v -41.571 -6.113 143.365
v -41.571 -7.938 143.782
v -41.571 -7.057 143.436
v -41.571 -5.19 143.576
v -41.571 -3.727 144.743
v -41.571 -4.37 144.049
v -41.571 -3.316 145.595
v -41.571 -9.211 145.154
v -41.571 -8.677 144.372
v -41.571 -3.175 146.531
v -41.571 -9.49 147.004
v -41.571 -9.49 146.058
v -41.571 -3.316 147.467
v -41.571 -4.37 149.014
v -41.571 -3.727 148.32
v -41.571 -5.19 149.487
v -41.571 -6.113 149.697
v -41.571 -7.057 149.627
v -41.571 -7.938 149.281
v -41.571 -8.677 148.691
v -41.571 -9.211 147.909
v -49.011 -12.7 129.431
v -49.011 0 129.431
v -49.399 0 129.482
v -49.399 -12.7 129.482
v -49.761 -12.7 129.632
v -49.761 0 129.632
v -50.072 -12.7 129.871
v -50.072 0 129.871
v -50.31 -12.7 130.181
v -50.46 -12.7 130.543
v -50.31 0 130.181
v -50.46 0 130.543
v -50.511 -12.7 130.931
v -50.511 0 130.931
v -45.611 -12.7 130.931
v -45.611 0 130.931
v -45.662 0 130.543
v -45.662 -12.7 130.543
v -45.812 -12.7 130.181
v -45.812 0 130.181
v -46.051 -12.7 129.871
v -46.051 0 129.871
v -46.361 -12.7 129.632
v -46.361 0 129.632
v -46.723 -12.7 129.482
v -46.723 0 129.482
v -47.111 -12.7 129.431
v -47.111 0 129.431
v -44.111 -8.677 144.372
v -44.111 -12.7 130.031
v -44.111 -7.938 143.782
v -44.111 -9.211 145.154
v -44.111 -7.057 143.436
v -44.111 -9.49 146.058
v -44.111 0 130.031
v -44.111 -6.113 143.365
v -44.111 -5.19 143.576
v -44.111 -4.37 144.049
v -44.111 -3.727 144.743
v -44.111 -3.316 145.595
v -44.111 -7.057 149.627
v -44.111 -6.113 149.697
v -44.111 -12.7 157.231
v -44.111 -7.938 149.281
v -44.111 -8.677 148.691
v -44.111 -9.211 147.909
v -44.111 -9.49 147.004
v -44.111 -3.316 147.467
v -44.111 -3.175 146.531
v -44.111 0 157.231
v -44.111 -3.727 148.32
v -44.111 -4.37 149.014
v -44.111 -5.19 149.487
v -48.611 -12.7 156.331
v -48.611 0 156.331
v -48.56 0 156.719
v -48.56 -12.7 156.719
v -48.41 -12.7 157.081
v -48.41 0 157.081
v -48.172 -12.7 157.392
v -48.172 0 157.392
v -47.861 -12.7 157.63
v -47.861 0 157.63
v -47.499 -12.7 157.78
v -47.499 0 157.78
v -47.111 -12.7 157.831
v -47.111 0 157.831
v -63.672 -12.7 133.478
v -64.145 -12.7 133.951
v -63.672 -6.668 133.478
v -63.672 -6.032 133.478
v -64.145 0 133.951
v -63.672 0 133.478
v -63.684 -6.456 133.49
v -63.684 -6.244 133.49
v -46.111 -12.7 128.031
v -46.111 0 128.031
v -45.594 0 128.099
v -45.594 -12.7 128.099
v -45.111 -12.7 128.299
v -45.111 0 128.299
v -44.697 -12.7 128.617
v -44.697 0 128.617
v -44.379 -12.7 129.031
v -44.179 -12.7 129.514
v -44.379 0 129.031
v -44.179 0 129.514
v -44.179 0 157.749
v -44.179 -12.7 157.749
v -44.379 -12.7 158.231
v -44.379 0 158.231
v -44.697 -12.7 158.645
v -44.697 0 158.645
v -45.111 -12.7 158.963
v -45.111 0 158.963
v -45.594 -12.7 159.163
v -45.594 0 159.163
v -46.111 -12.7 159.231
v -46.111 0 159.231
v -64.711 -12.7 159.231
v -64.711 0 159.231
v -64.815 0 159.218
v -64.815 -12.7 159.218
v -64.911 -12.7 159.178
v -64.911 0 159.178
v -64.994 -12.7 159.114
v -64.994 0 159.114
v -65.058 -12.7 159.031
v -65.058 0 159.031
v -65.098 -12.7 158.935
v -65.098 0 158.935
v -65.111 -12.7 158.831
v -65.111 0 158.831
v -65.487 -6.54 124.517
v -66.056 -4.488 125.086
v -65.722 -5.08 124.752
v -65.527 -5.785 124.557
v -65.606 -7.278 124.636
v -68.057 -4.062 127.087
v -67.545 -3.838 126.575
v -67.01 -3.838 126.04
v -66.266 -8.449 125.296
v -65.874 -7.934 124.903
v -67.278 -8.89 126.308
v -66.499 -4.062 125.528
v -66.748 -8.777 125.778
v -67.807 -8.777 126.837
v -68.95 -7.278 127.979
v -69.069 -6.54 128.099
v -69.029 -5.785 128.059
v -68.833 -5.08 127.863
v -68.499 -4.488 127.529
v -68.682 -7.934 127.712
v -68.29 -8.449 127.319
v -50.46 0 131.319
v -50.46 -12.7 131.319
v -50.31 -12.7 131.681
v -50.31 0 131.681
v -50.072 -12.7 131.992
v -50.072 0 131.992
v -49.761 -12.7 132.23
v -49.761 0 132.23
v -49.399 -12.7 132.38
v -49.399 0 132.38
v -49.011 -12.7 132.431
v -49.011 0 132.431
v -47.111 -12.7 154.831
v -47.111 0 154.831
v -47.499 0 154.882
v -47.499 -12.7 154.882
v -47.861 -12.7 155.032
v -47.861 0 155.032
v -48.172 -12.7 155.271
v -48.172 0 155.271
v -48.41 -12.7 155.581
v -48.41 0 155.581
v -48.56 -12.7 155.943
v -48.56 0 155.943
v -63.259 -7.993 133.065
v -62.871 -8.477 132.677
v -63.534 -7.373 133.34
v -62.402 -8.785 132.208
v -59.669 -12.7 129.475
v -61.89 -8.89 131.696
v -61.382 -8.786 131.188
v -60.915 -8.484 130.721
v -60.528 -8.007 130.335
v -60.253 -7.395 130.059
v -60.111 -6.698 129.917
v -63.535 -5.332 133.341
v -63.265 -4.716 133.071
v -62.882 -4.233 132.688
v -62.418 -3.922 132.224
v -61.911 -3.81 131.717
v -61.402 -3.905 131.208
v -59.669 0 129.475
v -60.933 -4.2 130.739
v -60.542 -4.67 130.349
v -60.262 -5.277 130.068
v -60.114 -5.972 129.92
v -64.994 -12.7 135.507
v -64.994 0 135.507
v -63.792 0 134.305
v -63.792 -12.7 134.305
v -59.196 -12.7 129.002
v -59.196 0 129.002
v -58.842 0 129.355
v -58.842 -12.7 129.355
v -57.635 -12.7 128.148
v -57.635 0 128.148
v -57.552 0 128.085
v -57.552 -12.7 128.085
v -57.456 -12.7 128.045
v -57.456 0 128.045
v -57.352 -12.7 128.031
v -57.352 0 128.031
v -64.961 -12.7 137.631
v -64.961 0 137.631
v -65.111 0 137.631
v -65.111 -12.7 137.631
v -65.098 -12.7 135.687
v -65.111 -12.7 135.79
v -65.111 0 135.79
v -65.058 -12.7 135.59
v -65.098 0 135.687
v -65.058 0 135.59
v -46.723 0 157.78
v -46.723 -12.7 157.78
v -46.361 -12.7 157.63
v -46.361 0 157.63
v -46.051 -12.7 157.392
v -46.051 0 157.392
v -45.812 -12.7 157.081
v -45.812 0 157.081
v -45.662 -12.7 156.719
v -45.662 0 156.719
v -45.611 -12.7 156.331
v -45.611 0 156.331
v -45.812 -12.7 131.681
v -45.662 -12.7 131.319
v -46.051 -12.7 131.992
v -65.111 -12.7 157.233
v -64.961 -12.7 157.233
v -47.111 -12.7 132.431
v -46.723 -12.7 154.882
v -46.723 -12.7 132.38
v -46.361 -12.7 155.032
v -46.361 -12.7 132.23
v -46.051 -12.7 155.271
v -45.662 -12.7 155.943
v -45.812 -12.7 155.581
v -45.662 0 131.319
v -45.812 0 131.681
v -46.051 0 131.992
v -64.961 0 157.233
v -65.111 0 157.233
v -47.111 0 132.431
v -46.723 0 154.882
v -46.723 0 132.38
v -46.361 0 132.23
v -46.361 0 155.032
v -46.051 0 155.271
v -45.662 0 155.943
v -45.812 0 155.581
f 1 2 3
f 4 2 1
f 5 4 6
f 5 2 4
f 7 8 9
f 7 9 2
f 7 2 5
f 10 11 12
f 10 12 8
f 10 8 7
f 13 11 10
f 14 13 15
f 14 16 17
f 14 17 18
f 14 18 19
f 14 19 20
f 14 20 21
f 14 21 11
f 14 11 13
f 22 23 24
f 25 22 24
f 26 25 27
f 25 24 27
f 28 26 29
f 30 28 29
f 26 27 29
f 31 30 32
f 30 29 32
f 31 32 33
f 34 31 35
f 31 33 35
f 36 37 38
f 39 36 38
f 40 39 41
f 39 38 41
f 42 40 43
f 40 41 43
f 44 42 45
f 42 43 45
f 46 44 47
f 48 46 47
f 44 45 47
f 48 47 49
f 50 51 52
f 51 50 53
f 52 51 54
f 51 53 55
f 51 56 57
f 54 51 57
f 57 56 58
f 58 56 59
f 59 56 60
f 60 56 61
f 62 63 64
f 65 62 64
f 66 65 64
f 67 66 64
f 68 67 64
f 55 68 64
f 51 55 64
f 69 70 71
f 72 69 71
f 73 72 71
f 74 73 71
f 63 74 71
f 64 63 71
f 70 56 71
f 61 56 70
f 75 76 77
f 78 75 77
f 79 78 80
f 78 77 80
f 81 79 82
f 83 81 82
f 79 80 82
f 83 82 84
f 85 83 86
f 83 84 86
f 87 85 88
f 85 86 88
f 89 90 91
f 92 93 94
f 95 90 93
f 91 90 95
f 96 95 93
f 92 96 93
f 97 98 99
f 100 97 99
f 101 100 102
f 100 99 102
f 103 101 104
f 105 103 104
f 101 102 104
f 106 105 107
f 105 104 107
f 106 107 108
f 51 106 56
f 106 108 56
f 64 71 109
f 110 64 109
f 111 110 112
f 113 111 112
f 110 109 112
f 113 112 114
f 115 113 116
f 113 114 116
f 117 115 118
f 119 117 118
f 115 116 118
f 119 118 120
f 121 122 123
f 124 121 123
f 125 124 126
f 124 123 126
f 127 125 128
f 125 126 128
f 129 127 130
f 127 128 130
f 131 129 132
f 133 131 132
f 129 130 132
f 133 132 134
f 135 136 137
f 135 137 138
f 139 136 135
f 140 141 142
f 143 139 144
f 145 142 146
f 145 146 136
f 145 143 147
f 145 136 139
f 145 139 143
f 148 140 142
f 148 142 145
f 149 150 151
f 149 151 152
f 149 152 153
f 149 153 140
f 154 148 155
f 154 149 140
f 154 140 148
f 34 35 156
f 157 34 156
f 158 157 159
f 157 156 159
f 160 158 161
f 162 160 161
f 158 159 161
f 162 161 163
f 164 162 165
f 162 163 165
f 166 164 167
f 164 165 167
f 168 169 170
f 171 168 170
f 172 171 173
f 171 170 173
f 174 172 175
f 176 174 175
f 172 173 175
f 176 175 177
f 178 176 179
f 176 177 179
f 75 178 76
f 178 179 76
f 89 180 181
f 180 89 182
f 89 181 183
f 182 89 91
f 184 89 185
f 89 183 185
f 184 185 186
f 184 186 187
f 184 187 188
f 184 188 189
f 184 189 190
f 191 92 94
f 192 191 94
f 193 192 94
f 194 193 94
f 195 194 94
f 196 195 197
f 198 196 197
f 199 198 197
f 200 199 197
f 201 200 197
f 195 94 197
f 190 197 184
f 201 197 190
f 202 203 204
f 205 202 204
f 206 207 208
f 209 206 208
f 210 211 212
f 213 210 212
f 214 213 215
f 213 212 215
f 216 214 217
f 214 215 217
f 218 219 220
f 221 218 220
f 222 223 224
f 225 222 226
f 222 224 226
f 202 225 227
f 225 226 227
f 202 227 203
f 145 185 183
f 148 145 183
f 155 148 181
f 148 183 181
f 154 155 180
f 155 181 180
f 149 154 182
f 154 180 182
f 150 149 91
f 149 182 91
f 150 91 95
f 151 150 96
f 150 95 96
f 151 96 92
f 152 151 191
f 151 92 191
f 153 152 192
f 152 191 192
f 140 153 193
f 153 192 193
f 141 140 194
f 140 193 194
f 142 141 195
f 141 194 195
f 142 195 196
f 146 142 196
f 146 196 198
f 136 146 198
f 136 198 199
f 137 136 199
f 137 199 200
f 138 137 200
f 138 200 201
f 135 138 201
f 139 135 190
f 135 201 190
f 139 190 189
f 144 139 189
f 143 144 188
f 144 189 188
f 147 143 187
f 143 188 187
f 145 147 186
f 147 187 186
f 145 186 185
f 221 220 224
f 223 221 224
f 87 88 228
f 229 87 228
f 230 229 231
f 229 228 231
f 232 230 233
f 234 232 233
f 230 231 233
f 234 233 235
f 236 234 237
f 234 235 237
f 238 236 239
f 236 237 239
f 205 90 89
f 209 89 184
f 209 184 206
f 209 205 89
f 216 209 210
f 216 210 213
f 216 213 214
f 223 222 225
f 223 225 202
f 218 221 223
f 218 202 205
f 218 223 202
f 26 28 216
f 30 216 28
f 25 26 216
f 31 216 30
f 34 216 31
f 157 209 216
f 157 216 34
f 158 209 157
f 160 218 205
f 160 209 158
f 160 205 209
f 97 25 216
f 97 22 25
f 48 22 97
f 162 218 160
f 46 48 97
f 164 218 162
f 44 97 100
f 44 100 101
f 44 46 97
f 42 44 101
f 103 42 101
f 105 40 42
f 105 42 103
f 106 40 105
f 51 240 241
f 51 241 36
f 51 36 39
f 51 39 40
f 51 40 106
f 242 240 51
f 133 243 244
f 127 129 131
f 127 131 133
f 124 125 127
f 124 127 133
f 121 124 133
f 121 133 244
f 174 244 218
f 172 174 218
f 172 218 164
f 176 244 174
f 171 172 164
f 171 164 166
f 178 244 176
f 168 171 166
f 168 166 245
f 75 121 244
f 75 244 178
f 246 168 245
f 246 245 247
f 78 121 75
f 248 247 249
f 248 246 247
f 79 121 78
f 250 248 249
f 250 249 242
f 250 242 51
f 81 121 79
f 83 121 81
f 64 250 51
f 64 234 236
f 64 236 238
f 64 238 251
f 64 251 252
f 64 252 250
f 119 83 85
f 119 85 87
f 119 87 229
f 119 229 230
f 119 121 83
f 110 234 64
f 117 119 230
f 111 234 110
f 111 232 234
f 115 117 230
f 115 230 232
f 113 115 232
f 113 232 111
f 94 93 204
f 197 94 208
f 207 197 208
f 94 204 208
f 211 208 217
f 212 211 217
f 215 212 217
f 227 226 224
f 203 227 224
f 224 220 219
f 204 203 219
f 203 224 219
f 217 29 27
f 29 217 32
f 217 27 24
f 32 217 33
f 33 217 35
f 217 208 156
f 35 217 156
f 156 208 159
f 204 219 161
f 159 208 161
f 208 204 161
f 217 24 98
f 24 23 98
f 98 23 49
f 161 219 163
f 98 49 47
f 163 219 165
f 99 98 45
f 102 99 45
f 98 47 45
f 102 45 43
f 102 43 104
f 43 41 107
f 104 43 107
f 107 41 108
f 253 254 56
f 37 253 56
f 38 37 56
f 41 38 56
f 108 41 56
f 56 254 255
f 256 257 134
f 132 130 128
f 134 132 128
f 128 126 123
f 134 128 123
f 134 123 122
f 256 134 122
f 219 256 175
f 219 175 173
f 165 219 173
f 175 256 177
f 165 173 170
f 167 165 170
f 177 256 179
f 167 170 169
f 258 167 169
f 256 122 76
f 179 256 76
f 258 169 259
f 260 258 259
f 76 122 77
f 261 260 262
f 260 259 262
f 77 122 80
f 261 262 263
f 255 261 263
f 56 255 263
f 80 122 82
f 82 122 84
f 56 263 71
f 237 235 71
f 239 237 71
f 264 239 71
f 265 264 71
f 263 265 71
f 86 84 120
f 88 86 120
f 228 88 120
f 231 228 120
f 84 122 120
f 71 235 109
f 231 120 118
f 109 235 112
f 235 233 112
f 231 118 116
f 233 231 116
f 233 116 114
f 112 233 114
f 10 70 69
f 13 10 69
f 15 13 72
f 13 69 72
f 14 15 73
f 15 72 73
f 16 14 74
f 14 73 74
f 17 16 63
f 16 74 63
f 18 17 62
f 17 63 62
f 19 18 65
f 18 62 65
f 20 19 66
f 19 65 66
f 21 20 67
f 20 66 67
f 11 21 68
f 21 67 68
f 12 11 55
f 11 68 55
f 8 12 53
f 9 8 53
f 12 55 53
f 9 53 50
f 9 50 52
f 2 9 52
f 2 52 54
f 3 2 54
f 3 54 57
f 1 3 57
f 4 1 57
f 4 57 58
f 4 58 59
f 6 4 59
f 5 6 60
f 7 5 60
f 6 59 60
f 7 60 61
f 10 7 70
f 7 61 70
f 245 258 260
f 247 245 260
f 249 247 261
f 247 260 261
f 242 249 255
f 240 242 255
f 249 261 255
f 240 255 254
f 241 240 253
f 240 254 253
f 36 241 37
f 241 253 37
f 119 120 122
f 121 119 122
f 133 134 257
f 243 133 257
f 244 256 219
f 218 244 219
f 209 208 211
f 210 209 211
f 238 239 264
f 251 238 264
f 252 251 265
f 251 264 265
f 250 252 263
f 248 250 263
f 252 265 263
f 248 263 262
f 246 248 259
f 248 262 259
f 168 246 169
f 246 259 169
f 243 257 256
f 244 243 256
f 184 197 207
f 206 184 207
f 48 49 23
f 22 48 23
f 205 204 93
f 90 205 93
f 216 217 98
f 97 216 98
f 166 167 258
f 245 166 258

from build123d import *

# Parameters (mm, degrees)
F1_DEPTH = 12.7
F2_R     = 2.54
F3_DEPTH = 7.62
F4_R     = 3.175
F5_DEPTH = 2.54


# Not quite as in the source:
# - ends of sketch curves that miss each other by under 0.0002 mm in the source are joined


with BuildPart() as f1:
    # F0 (on Front) → F1 (new body)
    with BuildSketch(Plane.XZ):
        with BuildLine():
            Line((-46.1111856, 159.2312536), (-64.7111856, 159.2312536))
            ThreePointArc((-64.7111856, 159.2312536), (-64.9940283125, 159.1140963125), (-65.1111856, 158.8312536))
            Line((-65.1111856, 158.8312536), (-65.1111856, 157.2332636))
            Line((-65.1111856, 157.2332636), (-64.9611856, 157.2332636))
            Line((-64.9611856, 157.2332636), (-64.9611856, 137.6312536))
            Line((-64.9611856, 137.6312536), (-65.1111856, 137.6312536))
            Line((-65.1111856, 137.6312536), (-65.1111856, 135.7900576))
            ThreePointArc((-65.1111856, 135.7900576), (-65.080737413, 135.6369842271), (-64.9940283125, 135.5072148875))
            Line((-64.9940283125, 135.5072148875), (-63.7917726, 134.3049586))
            Line((-63.7917726, 134.3049586), (-64.1453256, 133.9514056))
            Line((-64.1453256, 133.9514056), (-63.6715641479, 133.4776440521))
            Line((-63.6715641479, 133.4776440521), (-59.6693400521, 129.4754191479))
            Line((-59.6693400521, 129.4754191479), (-59.1955786, 129.0016576))
            Line((-59.1955786, 129.0016576), (-58.8420246, 129.3552116))
            Line((-58.8420246, 129.3552116), (-57.6352246, 128.1484116))
            ThreePointArc((-57.6352246, 128.1484116), (-57.5054559729, 128.061701787), (-57.3523826, 128.0312536))
            Line((-57.3523826, 128.0312536), (-46.1111856, 128.0312536))
            ThreePointArc((-46.1111856, 128.0312536), (-44.6969720376, 128.6170400376), (-44.1111856, 130.0312536))
            Line((-44.1111856, 130.0312536), (-44.1111856, 134.1120546))
            Line((-44.1111856, 134.1120546), (-44.1111856, 153.1264526))
            Line((-44.1111856, 153.1264526), (-44.1111856, 156.3312536))
            Line((-44.1111856, 156.3312536), (-44.1111856, 157.2312536))
            ThreePointArc((-44.1111856, 157.2312536), (-44.6969720376, 158.6454671624), (-46.1111856, 159.2312536))
        make_face()
        with BuildLine():
            Line((-49.0111856, 132.4312536), (-47.1111856, 132.4312536))
            ThreePointArc((-47.1111856, 132.4312536), (-46.0505254282, 131.9919137718), (-45.6111856, 130.9312536))
            ThreePointArc((-45.6111856, 130.9312536), (-46.0505254282, 129.8705934282), (-47.1111856, 129.4312536))
            Line((-47.1111856, 129.4312536), (-49.0111856, 129.4312536))
            ThreePointArc((-49.0111856, 129.4312536), (-50.0718457718, 129.8705934282), (-50.5111856, 130.9312536))
            ThreePointArc((-50.5111856, 130.9312536), (-50.0718457718, 131.9919137718), (-49.0111856, 132.4312536))
        make_face(mode=Mode.SUBTRACT)
        with BuildLine():
            ThreePointArc((-47.1111856, 157.8312536), (-46.0505254282, 157.3919137718), (-45.6111856, 156.3312536))
            ThreePointArc((-45.6111856, 156.3312536), (-46.0505254282, 155.2705934282), (-47.1111856, 154.8312536))
            ThreePointArc((-47.1111856, 154.8312536), (-48.1718457718, 155.2705934282), (-48.6111856, 156.3312536))
            ThreePointArc((-48.6111856, 156.3312536), (-48.1718457718, 157.3919137718), (-47.1111856, 157.8312536))
        make_face(mode=Mode.SUBTRACT)
    extrude(amount=F1_DEPTH)

    # F2 (on face) → F3 (join)
    with BuildSketch(Plane(origin=(34.9030335203, 0, 34.9030264689), x_dir=(0, -1, 0), z_dir=(-0.7071068526, 0, -0.7071067098))):
        with Locations((6.35, 136.8855469037)):
            Circle(F2_R)
    extrude(amount=F3_DEPTH)

    # F4 (on face) → F5 (join)
    with BuildSketch(Plane.YZ.offset(-44.1111856)):
        with Locations((-6.35, 146.5312536)):
            Circle(F4_R)
    extrude(amount=F5_DEPTH)


solid = f1.part
